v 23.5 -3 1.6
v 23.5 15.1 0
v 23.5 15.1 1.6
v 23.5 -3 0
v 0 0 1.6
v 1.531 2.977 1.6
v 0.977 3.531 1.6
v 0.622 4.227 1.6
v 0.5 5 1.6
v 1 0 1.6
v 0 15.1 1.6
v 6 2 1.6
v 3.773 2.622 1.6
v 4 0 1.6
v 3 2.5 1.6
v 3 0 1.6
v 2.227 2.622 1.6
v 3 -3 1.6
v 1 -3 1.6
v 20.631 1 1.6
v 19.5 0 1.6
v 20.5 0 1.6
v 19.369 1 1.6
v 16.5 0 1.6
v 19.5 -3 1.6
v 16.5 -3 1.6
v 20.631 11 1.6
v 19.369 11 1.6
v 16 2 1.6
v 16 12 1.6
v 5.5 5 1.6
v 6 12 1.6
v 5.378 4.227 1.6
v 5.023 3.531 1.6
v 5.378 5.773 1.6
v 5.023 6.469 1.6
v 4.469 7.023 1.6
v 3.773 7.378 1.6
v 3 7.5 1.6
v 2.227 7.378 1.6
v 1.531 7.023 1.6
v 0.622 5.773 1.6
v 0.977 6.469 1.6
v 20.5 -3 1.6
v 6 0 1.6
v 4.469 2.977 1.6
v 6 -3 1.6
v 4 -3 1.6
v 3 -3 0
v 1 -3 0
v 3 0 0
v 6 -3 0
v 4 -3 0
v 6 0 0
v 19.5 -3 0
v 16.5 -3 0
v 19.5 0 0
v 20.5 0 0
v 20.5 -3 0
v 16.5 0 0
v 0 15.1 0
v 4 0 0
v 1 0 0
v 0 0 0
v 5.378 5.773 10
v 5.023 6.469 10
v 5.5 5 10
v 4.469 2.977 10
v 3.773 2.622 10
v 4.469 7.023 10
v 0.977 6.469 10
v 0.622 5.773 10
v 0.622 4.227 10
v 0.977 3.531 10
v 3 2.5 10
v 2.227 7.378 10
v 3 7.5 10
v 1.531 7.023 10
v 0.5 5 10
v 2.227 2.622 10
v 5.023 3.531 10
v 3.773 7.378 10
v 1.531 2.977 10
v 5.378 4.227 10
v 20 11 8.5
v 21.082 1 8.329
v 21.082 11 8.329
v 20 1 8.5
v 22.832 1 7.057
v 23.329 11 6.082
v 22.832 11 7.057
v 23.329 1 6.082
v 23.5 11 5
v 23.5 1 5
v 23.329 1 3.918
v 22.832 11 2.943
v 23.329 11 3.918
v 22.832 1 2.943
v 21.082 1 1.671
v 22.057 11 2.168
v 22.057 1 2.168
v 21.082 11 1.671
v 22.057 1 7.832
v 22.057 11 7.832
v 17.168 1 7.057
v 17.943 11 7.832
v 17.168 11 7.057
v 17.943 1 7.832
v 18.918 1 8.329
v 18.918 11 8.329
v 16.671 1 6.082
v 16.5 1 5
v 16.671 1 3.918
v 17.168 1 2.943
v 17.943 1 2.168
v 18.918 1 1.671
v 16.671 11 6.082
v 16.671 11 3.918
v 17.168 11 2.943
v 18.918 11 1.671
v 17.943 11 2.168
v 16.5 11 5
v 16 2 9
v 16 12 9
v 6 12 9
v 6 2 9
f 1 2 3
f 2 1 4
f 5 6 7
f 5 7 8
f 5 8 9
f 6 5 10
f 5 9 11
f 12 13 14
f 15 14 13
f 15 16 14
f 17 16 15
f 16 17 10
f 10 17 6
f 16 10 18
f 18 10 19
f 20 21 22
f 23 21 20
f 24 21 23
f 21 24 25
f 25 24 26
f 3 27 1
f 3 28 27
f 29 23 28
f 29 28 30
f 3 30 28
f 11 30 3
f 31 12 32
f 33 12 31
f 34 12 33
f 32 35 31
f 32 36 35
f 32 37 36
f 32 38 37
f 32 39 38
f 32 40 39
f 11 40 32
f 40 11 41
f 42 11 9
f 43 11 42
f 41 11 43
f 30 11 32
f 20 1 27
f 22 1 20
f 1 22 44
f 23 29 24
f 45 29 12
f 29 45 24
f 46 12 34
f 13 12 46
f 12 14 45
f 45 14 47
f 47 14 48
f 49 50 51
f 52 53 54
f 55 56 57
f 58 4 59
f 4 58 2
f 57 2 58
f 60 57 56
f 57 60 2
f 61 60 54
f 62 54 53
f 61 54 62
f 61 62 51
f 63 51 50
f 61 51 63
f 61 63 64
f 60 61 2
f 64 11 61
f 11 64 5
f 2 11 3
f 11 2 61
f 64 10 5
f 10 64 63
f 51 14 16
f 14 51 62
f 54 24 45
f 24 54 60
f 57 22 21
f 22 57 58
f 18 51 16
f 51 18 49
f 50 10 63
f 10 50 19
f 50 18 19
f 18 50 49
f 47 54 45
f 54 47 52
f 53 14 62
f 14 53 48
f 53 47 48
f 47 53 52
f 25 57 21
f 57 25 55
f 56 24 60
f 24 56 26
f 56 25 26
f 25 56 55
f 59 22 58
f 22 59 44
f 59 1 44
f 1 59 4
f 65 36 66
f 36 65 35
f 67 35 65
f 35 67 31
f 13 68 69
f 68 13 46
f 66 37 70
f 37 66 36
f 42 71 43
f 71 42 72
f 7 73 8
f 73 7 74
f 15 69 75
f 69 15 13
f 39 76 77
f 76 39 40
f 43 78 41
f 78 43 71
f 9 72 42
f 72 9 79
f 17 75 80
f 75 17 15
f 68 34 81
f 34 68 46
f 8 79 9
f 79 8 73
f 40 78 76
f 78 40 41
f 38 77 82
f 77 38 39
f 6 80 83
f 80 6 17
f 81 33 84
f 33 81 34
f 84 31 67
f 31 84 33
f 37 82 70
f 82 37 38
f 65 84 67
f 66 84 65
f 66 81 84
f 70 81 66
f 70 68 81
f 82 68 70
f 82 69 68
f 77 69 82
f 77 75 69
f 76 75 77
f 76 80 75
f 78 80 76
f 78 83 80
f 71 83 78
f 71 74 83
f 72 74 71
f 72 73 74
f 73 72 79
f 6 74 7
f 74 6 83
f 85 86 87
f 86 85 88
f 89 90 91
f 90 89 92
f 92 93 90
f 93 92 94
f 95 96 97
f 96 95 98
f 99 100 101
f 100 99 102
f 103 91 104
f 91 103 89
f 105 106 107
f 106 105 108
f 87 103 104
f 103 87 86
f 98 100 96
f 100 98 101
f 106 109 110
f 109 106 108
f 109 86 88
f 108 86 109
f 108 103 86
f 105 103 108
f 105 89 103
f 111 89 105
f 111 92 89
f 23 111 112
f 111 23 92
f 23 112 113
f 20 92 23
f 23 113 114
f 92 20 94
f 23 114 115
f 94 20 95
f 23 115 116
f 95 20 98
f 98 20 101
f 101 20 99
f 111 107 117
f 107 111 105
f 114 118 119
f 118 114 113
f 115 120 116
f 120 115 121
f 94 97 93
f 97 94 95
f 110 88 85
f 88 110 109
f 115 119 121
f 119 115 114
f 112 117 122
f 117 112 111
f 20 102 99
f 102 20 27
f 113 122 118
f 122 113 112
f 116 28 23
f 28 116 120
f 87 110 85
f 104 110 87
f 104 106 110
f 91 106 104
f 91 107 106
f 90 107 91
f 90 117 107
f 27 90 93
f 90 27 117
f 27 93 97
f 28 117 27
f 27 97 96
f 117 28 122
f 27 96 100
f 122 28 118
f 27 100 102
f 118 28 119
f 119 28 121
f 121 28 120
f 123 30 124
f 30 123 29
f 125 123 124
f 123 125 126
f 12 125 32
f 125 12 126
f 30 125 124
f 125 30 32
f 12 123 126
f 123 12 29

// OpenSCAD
cube([23.5,15.1,1.6]);
translate([1,-3,0])cube([2,3,1.6]);
translate([4,-3,0])cube([2,3,1.6]);
translate([20.5 - 4,-3,0])cube([3,4,1.6]);
translate([20.5,-3,0])cube([3,4,1.6]);

translate([3,5,0])cylinder(h=10,d=5,$fn=20);
translate([20,11,5])rotate([90,0,0])cylinder(h=10,d=7,$fn=20);
translate([6,2,0])cube([10,10,9]);
